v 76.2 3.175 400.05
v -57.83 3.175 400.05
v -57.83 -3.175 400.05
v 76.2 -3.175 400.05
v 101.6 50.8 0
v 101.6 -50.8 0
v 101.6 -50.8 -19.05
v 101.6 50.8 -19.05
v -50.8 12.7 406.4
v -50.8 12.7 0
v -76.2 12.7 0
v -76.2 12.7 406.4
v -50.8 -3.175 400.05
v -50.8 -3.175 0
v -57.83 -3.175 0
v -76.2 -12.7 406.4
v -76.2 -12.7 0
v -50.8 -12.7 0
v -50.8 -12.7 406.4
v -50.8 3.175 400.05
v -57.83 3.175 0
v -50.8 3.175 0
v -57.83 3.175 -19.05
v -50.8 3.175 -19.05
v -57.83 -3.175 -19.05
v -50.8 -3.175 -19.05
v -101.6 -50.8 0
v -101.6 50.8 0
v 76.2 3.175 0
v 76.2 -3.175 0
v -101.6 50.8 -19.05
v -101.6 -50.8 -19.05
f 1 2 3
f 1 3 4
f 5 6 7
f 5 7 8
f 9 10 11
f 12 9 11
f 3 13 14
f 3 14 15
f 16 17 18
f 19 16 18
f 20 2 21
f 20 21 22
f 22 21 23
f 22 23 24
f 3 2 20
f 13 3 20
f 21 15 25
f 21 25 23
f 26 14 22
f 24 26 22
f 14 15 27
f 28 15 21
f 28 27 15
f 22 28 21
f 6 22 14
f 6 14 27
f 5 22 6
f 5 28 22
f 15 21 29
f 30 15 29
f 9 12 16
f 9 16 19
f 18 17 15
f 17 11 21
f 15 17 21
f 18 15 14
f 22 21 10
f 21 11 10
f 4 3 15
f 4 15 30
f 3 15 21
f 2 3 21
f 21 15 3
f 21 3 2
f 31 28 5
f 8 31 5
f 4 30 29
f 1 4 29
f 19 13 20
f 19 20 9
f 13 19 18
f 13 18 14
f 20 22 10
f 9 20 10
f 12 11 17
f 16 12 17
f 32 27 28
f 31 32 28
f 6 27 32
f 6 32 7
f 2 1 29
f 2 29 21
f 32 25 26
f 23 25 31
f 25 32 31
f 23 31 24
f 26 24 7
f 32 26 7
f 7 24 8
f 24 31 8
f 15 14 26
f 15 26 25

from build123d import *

# Parameters (mm, degrees)
F0_W     = 203.2
F0_H     = 101.6
F0_W_2   = 127
F0_H_2   = 6.35
F1_DEPTH = 19.05
F2_DEPTH = 406.4
F0_W_3   = 7.0298084438
F3_DEPTH = 400.05
F4_W     = 7.0298084438
F4_H     = 6.35
F5_DEPTH = 6.35


with BuildPart() as f1:
    # F0 (on Top) → F1 (new body)
    with BuildSketch(Plane.XY):
        Rectangle(F0_W, F0_H)
        Polygon((-76.2, 12.7), (-50.8, 12.7), (-50.8, 3.175), (76.2, 3.175), (76.2, -3.175), (-50.8, -3.175), (-50.8, -12.7), (-76.2, -12.7), align=None, mode=Mode.SUBTRACT)
        Polygon((-50.8, 3.175), (-50.8, 12.7), (-76.2, 12.7), (-76.2, -12.7), (-50.8, -12.7), (-50.8, -3.175), (-57.8298084438, -3.175), (-57.8298084438, 3.175), align=None)
        with Locations((12.7, 0)):
            Rectangle(F0_W_2, F0_H_2)
    extrude(amount=-F1_DEPTH)


with BuildPart() as f2:
    # F0 (on Top) → F2 (new body)
    with BuildSketch(Plane.XY):
        Polygon((-50.8, 3.175), (-50.8, 12.7), (-76.2, 12.7), (-76.2, -12.7), (-50.8, -12.7), (-50.8, -3.175), (-57.8298084438, -3.175), (-57.8298084438, 3.175), align=None)
    extrude(amount=F2_DEPTH)

    # F4 (on face) → F5 (join)
    with BuildSketch(Plane.XY.offset(406.4)):
        Polygon((-57.8298084438, -3.175), (-57.8298084438, 3.175), (-50.8, 3.175), (-50.8, 12.7), (-76.2, 12.7), (-76.2, -12.7), (-50.8, -12.7), (-50.8, -3.175), align=None)
        with Locations((-54.3149042219, 0)):
            Rectangle(F4_W, F4_H)
    extrude(amount=-F5_DEPTH)


with BuildPart() as f3:
    # F0 (on Top) → F3 (new body)
    with BuildSketch(Plane.XY):
        with Locations((12.7, 0)):
            Rectangle(F0_W_2, F0_H_2)
        with Locations((-54.3149042219, 0)):
            Rectangle(F0_W_3, F0_H_2)
    extrude(amount=F3_DEPTH)


solid = Compound([f1.part, f2.part, f3.part])
